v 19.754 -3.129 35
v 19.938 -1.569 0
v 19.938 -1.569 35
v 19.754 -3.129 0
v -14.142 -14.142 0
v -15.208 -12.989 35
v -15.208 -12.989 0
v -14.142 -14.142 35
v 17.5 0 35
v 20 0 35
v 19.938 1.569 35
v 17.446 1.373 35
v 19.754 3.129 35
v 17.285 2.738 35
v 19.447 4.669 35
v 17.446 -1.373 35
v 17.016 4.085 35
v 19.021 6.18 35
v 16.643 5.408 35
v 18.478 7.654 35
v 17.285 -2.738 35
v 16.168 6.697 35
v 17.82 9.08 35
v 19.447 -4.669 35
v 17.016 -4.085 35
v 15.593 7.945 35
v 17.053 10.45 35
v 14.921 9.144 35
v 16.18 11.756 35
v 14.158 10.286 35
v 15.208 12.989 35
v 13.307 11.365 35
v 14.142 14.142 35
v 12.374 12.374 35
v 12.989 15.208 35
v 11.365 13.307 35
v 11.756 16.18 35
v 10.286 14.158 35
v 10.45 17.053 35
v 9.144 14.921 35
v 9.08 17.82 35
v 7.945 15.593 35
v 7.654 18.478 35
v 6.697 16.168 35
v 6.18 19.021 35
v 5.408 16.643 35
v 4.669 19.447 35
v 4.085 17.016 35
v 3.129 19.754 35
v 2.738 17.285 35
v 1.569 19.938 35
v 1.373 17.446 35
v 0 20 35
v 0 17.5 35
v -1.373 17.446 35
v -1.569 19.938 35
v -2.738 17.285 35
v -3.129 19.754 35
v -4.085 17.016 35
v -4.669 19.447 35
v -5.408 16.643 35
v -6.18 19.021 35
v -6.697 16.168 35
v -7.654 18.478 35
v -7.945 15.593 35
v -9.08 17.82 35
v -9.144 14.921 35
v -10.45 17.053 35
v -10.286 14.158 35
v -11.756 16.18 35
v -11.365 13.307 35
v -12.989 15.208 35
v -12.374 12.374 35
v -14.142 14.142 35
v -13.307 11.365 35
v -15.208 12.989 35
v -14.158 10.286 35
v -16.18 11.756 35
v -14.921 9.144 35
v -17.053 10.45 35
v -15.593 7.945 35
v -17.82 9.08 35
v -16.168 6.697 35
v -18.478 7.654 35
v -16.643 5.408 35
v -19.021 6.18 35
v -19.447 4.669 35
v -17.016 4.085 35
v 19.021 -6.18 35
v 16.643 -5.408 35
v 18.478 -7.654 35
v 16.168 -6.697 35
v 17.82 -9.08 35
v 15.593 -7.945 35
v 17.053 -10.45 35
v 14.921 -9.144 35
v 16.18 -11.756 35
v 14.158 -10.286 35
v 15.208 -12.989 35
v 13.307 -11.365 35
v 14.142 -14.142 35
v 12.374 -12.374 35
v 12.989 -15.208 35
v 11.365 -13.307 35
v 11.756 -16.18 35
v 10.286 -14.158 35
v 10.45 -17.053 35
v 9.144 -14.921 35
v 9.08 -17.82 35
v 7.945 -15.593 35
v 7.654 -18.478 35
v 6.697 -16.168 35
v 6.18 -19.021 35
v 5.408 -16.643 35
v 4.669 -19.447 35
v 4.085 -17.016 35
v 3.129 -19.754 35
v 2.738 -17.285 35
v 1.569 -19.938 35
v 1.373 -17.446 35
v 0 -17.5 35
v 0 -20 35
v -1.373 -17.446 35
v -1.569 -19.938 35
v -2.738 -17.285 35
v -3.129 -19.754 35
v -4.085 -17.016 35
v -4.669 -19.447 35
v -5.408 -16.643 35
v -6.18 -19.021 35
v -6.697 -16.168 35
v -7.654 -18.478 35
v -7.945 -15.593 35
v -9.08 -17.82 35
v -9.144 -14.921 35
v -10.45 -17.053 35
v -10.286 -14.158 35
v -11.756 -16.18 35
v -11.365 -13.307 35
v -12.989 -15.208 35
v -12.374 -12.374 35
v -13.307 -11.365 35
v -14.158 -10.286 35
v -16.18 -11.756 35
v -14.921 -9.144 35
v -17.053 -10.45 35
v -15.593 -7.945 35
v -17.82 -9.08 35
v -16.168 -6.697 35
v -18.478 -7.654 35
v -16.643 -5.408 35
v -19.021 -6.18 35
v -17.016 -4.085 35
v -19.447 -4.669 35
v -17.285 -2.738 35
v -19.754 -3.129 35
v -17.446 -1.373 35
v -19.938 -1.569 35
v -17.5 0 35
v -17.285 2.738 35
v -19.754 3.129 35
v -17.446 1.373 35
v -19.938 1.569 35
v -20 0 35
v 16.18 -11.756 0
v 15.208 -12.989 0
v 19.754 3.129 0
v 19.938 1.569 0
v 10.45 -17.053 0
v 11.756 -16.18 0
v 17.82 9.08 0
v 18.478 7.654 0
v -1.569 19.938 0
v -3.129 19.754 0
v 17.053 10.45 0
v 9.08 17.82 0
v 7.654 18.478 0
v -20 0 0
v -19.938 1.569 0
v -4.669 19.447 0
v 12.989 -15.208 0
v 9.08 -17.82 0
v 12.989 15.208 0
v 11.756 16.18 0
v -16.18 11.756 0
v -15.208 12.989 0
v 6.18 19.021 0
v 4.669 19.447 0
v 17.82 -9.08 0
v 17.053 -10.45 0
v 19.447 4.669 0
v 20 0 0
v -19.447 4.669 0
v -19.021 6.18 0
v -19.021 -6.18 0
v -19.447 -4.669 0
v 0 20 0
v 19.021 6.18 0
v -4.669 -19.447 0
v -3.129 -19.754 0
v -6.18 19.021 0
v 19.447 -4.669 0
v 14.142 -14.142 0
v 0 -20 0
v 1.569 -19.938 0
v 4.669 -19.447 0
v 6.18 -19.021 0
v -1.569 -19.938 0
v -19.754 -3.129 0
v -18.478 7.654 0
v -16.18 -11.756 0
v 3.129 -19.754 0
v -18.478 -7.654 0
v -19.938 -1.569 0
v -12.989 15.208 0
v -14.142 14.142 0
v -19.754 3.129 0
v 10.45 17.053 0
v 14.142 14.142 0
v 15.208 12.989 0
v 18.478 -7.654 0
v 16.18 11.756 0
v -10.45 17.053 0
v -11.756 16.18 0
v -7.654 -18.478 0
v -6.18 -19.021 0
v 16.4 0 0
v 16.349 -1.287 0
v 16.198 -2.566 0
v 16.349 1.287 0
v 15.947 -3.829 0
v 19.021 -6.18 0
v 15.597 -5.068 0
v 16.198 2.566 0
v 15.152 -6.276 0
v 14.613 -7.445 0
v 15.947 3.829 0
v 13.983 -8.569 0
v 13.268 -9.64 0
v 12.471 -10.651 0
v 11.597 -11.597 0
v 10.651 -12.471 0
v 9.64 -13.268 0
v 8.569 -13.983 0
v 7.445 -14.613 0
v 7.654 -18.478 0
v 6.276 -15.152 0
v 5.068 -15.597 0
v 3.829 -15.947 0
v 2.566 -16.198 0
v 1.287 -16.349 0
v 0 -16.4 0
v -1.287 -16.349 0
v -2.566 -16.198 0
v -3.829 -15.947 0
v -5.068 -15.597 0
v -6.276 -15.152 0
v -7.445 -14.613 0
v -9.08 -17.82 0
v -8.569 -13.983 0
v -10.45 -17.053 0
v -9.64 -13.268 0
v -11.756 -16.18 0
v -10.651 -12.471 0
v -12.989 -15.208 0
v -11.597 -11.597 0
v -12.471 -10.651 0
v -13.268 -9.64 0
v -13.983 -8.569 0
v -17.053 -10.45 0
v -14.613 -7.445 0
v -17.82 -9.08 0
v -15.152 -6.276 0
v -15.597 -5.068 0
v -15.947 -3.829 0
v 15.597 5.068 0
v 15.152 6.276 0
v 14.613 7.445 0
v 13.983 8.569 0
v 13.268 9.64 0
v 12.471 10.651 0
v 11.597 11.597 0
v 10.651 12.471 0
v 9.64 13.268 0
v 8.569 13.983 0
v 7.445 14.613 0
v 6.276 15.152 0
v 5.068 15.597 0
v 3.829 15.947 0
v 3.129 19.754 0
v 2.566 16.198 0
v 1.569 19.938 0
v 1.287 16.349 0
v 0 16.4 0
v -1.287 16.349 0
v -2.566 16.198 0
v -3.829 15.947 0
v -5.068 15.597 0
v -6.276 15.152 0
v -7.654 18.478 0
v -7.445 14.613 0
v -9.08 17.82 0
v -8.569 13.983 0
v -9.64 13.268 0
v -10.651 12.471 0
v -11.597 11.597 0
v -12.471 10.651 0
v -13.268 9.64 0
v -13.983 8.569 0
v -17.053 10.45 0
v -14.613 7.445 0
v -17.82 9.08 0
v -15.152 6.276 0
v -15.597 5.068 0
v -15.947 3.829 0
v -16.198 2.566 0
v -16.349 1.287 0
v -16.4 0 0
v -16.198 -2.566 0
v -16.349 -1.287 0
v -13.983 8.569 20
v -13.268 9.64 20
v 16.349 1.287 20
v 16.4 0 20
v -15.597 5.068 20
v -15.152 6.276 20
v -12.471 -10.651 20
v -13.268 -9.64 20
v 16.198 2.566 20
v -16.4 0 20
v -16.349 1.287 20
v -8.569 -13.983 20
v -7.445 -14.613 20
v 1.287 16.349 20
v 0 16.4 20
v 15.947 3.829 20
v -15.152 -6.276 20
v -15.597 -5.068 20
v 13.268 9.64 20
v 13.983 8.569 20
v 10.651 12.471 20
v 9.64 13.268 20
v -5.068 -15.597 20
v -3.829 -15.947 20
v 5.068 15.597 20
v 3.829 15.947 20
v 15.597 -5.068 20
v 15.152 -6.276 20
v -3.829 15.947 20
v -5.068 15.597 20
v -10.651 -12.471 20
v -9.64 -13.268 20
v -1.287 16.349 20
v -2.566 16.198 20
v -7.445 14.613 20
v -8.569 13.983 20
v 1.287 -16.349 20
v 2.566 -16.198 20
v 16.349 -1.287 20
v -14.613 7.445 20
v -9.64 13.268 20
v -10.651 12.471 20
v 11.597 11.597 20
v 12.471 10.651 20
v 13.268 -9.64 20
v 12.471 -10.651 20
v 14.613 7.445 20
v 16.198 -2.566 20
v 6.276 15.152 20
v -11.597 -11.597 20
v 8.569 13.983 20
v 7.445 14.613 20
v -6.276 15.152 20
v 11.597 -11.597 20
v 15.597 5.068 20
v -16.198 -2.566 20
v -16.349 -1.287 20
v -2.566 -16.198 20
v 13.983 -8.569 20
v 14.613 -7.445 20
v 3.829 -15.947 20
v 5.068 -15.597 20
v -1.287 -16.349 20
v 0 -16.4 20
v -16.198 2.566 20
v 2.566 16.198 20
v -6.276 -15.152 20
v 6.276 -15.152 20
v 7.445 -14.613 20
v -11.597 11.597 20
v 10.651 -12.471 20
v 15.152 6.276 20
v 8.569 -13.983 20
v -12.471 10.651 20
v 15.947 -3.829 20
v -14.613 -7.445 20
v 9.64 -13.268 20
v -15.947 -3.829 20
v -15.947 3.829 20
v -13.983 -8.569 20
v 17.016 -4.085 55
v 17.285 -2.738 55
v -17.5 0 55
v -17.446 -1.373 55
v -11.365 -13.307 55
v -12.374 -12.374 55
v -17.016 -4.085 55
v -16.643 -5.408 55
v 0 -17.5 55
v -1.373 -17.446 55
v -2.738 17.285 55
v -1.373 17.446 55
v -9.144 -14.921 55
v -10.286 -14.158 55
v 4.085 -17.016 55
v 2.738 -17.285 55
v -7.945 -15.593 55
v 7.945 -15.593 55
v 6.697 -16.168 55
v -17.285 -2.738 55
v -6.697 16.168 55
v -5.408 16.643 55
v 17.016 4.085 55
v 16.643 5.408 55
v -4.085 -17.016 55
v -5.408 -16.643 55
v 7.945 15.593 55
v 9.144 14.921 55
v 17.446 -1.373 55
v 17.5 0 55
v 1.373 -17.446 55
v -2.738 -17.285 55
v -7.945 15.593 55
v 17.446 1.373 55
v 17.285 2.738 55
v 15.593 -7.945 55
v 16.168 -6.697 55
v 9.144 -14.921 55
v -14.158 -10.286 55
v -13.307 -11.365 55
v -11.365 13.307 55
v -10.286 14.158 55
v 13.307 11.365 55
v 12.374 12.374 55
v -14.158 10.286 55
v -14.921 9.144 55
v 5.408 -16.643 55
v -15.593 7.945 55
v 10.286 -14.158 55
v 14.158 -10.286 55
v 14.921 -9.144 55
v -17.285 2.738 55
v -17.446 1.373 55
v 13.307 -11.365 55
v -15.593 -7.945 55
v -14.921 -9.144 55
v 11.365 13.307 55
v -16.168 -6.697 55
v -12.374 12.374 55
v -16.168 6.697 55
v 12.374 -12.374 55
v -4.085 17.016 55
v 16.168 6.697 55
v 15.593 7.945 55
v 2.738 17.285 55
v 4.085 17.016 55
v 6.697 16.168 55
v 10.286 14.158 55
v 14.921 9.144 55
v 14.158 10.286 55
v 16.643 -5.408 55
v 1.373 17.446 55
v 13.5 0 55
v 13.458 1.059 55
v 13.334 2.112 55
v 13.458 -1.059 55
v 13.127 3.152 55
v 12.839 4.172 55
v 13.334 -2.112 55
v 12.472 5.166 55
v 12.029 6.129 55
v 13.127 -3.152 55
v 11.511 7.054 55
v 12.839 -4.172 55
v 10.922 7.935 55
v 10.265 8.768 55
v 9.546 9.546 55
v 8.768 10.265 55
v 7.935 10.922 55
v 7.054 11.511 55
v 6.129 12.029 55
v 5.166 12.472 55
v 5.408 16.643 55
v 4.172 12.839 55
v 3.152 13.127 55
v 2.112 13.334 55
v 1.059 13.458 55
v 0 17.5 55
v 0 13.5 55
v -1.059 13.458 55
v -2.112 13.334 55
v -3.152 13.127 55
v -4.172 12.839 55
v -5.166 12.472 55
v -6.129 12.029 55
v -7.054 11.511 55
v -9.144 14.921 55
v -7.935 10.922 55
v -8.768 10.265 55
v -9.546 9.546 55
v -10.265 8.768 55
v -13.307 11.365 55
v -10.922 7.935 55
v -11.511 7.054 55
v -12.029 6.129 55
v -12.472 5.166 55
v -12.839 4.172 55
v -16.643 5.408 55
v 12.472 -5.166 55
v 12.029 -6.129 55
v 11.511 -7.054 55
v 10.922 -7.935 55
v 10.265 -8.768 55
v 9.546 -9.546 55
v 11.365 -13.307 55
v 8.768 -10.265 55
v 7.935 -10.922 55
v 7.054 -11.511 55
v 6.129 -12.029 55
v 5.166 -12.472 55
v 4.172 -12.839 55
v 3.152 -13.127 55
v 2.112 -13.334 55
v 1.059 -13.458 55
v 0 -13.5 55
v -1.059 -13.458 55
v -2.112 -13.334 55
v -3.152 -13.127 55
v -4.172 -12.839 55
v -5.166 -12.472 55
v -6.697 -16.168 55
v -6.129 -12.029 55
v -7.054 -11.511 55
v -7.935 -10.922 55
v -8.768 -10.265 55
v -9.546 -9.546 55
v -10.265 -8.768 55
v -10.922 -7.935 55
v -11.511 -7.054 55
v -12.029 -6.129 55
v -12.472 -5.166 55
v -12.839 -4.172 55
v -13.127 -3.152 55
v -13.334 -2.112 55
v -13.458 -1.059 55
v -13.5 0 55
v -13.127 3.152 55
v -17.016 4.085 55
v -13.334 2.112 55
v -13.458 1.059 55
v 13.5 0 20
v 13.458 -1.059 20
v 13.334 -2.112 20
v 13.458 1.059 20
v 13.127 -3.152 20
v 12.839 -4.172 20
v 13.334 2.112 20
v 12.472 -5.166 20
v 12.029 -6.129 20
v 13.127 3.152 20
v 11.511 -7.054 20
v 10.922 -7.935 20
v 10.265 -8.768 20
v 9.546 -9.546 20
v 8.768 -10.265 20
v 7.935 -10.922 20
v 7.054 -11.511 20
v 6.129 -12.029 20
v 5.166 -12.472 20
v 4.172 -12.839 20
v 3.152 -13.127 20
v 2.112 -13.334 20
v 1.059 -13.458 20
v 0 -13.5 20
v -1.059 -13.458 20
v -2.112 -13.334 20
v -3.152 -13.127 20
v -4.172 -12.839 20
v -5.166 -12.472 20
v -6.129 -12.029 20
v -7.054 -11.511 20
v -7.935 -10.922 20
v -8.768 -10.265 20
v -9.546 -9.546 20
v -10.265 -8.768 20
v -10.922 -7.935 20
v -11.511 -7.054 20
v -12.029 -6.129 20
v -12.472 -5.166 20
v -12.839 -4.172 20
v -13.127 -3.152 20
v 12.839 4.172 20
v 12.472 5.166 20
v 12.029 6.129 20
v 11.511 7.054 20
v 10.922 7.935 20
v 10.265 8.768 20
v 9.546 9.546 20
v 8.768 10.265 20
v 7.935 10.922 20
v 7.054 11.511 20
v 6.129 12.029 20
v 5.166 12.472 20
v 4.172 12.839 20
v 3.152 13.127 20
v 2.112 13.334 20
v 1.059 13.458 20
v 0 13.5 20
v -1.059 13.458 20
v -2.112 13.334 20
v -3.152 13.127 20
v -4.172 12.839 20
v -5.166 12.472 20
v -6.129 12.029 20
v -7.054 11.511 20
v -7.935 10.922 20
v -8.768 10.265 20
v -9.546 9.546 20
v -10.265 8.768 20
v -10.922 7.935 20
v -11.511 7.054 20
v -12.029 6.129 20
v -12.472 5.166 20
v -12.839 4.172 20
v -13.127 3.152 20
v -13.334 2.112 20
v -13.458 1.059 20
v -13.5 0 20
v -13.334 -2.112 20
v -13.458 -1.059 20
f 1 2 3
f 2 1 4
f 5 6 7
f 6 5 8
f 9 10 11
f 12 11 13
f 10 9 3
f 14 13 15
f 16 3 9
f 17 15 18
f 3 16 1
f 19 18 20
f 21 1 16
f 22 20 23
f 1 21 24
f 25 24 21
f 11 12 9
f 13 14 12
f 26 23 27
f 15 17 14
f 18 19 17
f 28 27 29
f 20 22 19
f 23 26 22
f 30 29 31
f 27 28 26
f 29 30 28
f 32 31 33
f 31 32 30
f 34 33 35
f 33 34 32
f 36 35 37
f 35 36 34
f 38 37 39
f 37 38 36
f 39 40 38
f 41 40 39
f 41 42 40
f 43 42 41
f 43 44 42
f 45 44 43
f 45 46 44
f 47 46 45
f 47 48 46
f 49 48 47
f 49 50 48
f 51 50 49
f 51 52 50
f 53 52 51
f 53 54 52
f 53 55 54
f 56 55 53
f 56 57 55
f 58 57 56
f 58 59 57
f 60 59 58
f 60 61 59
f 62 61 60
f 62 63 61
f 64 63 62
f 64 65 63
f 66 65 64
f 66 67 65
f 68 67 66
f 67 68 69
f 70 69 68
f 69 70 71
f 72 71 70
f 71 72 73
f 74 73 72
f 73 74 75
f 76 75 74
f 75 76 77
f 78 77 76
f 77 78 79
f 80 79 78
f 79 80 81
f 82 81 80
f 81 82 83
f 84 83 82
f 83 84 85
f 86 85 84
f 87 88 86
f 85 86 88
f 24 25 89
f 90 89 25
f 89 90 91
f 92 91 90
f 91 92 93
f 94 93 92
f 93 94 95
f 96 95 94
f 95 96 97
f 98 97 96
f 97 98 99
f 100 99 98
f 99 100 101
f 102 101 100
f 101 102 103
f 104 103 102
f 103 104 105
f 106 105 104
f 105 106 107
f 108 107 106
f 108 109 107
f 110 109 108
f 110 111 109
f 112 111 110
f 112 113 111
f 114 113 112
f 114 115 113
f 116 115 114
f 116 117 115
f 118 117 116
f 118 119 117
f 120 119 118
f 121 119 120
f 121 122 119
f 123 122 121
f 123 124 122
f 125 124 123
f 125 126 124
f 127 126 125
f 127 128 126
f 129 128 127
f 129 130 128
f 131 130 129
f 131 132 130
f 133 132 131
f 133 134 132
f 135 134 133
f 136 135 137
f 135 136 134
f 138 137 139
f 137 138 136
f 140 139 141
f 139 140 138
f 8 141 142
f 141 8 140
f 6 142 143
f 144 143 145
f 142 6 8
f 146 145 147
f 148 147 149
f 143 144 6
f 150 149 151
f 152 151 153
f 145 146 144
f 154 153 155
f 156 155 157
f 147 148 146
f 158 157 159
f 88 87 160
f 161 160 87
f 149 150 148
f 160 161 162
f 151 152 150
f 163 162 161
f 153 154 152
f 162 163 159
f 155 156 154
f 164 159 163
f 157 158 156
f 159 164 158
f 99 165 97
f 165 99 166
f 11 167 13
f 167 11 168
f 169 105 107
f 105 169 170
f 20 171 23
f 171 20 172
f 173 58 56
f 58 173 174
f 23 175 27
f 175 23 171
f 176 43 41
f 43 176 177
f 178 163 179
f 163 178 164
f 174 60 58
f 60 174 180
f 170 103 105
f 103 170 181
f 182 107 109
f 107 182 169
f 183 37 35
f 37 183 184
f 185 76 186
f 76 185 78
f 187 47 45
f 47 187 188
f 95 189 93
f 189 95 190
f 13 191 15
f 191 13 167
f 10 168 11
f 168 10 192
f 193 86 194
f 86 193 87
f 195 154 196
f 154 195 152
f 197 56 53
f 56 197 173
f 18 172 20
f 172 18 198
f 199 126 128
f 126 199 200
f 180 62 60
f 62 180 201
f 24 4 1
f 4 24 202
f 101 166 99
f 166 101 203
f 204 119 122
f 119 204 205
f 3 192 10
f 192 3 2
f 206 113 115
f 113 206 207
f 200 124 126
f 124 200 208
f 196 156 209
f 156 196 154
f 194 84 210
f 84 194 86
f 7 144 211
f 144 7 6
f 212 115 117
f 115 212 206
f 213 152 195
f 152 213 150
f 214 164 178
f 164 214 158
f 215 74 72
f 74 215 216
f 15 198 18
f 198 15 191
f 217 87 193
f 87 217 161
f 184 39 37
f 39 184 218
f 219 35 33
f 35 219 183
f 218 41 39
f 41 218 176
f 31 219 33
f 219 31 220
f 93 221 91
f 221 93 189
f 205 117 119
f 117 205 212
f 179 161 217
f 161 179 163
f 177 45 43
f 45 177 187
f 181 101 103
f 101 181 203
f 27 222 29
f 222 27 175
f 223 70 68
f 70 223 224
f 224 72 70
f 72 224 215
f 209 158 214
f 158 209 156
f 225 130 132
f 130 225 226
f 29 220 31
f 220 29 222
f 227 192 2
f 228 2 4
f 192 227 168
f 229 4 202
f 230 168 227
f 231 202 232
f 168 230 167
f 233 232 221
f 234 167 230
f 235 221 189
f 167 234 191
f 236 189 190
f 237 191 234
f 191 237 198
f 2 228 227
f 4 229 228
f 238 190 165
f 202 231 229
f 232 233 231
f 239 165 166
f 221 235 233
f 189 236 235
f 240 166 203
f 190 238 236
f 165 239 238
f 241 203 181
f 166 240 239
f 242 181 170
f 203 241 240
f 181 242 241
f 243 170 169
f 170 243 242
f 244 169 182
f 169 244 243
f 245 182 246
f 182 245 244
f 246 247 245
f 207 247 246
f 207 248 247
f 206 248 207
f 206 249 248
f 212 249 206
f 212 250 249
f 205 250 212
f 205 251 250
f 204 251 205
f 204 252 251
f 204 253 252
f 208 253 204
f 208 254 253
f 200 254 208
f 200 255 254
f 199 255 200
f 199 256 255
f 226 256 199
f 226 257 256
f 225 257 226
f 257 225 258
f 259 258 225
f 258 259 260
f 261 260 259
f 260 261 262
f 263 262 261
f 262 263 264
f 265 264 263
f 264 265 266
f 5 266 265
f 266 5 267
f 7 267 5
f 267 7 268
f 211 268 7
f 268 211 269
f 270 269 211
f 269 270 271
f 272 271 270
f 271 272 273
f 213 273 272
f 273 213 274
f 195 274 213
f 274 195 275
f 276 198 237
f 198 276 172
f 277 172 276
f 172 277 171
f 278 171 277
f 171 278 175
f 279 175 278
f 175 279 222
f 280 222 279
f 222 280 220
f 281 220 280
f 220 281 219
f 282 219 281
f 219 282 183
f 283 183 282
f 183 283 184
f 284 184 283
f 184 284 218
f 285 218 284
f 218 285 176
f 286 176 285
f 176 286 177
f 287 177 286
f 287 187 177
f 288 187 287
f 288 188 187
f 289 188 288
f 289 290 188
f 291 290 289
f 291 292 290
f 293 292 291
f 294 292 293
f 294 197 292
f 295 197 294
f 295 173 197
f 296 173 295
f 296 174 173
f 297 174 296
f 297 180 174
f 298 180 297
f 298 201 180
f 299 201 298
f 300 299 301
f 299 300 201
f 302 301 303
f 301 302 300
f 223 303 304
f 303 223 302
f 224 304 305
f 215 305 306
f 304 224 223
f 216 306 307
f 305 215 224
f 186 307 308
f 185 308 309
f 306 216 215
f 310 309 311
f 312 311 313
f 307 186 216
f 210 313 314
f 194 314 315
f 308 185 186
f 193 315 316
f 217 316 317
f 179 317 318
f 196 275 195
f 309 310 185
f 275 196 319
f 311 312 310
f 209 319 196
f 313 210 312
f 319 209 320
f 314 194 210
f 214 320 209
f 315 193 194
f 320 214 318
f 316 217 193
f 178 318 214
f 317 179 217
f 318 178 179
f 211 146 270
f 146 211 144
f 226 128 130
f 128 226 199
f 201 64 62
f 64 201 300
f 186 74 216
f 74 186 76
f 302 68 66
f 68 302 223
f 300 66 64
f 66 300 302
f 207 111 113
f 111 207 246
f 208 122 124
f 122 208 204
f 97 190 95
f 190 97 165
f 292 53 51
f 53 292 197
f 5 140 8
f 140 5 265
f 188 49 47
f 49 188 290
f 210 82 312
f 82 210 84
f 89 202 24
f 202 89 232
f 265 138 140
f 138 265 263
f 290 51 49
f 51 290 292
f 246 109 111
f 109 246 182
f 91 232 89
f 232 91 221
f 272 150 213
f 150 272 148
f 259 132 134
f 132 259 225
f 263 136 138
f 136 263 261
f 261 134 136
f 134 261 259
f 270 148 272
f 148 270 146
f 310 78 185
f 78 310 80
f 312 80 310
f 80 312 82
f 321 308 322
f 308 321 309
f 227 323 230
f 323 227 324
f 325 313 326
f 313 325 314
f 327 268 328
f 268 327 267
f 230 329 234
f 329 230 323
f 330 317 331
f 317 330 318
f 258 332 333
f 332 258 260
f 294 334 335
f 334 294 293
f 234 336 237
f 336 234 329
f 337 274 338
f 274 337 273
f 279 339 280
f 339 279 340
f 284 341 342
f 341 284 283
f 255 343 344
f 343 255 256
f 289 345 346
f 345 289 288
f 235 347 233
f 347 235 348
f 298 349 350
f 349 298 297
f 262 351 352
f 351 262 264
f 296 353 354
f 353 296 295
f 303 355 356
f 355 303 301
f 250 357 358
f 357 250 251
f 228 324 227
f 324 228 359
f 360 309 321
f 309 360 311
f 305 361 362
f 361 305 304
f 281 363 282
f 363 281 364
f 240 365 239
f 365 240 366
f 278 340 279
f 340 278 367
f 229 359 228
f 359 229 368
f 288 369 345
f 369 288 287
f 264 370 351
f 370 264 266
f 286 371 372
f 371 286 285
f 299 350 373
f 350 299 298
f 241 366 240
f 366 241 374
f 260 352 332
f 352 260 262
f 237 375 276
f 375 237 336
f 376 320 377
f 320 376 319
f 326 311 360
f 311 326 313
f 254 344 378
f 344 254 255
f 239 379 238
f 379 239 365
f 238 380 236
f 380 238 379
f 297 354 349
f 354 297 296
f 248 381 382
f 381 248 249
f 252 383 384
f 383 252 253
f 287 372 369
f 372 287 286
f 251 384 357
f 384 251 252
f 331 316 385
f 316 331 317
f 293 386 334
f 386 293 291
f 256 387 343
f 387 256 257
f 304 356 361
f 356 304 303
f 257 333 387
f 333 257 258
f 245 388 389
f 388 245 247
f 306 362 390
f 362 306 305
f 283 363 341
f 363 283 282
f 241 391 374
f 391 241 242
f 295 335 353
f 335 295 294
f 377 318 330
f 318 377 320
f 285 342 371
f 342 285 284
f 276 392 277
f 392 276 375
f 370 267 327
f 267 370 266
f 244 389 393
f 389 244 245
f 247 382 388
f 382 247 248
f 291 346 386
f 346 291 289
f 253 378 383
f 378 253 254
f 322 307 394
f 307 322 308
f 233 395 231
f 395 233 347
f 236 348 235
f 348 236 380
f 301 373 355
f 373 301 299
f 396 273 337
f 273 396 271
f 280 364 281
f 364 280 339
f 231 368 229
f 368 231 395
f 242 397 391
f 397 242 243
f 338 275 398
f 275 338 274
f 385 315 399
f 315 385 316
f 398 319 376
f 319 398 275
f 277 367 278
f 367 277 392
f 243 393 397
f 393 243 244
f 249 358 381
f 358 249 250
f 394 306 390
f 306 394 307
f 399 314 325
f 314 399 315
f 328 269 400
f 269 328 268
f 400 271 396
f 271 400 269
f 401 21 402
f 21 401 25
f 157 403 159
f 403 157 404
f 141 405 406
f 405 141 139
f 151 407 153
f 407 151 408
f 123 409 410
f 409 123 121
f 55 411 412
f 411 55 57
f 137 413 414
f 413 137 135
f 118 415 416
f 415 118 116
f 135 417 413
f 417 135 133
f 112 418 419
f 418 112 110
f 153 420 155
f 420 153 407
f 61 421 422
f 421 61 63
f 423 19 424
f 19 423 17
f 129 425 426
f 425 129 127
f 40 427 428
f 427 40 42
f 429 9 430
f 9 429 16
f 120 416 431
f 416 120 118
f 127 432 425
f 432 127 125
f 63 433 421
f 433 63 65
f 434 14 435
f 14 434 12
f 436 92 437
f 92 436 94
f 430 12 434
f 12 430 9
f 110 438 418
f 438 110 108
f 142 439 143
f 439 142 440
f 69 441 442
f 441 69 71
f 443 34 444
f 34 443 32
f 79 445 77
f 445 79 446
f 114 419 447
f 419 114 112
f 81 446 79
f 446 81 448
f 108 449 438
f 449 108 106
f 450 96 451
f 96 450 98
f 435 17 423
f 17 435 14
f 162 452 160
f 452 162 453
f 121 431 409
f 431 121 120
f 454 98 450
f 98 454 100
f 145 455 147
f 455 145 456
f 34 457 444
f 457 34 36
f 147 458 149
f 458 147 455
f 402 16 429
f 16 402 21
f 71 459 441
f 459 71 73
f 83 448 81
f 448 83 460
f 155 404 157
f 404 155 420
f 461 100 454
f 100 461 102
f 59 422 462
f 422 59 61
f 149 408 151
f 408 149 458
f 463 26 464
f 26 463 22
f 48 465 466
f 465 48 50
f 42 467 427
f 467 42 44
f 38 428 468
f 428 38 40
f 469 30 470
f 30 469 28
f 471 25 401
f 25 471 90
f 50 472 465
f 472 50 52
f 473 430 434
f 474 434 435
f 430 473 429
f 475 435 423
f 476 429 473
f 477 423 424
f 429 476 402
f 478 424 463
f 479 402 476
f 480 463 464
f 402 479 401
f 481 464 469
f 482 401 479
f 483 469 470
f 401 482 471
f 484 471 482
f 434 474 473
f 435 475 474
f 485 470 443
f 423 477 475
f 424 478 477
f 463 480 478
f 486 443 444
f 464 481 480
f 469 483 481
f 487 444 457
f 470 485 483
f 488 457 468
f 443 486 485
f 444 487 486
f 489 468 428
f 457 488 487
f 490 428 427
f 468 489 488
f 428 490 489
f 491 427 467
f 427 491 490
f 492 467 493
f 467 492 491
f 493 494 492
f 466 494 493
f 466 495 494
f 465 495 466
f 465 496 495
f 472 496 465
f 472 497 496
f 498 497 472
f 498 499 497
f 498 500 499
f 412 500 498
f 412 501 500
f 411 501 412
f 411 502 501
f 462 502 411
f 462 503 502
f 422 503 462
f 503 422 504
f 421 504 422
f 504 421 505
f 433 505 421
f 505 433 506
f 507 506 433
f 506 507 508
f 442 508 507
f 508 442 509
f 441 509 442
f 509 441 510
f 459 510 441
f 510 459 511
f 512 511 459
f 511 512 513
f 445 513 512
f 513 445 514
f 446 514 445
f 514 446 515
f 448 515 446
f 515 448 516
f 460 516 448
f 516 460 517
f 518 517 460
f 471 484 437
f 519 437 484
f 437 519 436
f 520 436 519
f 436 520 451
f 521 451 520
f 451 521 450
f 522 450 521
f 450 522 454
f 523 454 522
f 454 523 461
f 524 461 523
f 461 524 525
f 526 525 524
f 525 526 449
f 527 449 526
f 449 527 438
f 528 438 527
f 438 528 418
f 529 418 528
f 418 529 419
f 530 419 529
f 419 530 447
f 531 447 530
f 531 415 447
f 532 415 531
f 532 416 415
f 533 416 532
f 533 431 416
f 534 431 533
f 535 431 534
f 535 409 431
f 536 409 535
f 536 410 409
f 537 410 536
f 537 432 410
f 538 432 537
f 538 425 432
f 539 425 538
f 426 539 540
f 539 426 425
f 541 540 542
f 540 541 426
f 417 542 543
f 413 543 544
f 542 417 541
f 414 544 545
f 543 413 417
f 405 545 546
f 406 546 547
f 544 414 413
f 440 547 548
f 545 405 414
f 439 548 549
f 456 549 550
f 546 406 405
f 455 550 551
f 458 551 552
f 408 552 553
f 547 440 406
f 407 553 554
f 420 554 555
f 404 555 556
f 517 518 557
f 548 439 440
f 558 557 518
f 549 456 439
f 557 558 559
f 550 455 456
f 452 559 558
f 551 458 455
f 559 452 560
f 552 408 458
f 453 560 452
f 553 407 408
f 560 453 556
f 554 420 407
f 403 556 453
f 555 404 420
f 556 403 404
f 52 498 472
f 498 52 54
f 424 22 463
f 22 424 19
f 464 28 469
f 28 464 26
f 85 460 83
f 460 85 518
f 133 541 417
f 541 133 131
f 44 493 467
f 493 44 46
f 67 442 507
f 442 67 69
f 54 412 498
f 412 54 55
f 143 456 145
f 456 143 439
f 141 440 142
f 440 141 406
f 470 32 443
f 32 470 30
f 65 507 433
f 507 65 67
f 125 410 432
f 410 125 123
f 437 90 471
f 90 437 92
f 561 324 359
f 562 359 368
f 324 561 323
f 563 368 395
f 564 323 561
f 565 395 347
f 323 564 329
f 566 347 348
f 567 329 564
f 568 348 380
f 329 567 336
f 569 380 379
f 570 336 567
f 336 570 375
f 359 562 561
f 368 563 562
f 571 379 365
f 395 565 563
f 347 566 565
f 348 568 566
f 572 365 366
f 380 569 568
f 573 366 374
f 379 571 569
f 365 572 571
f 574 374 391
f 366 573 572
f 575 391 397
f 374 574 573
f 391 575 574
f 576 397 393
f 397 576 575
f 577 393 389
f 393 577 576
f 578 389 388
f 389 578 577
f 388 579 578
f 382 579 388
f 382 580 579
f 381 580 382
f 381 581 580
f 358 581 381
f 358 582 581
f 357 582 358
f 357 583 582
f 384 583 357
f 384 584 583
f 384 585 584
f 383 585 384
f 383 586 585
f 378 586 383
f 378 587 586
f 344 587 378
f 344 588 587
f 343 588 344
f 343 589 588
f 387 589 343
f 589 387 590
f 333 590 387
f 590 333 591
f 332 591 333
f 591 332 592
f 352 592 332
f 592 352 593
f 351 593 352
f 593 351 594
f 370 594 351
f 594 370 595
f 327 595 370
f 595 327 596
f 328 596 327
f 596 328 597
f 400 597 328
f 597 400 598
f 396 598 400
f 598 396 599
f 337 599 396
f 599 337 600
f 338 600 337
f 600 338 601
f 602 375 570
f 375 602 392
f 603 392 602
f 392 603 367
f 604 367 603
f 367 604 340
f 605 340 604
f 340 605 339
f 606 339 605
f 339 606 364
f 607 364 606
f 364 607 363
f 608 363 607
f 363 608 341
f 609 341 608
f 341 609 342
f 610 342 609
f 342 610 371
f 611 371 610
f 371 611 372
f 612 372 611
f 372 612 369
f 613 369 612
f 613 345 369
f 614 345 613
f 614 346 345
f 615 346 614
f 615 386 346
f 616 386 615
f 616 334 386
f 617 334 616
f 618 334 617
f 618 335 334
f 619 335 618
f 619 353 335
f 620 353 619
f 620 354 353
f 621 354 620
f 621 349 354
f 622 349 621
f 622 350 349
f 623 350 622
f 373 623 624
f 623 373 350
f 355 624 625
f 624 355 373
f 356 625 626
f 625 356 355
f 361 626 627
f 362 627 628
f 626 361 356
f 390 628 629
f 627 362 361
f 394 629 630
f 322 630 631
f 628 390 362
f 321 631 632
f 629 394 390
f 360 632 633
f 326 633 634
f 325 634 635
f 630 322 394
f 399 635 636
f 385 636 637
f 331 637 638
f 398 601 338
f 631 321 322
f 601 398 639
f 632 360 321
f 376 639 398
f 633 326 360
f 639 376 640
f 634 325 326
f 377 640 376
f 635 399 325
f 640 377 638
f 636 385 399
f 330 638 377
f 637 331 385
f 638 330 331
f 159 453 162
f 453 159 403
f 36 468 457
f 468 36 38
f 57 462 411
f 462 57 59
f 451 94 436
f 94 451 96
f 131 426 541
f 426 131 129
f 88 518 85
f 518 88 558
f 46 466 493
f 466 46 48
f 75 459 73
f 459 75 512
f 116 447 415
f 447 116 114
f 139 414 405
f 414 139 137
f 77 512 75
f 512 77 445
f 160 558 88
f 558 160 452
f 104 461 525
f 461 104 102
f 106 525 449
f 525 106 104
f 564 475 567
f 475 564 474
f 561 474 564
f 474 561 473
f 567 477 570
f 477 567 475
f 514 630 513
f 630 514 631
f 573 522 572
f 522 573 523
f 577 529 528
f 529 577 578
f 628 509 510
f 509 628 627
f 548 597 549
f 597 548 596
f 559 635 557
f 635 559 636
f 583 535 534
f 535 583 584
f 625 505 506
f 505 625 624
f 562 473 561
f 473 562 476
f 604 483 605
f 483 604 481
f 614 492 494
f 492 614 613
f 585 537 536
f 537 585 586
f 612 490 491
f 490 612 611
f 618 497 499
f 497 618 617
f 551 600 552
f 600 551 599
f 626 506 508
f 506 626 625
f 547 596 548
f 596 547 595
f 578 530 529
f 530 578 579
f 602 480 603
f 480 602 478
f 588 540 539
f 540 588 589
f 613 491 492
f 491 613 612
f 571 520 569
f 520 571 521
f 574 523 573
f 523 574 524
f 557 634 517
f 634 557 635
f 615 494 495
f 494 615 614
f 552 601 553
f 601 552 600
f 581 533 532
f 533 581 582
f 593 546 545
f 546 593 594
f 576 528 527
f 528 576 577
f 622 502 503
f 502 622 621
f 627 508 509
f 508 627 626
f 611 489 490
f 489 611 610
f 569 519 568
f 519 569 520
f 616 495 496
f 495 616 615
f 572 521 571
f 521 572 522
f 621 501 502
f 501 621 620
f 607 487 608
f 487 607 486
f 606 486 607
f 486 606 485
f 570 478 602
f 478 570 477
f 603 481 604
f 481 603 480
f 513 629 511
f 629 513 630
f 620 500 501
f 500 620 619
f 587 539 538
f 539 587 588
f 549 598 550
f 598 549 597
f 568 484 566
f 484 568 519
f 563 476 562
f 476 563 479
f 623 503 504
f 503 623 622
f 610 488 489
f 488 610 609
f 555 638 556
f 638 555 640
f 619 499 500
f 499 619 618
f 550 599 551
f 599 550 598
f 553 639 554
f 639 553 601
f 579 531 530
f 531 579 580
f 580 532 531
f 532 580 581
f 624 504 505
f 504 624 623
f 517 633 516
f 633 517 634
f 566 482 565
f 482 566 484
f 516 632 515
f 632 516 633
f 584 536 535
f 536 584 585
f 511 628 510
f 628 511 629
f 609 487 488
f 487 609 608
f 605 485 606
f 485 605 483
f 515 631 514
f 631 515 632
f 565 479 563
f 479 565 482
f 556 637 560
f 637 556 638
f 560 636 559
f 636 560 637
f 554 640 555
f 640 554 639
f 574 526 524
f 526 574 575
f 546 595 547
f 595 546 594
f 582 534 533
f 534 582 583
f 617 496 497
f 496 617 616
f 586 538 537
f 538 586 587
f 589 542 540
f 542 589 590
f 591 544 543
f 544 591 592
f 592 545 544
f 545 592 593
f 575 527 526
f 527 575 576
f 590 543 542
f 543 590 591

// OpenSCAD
// file: variables.scad
// General

resolution = 80;
delta = 0.2;

// dimensions tubes pvc

rayon_ext_tube_32 = 16;
rayon_int_tube_32 = 13;
epaisseur_tube_32 = rayon_ext_tube_32 - rayon_int_tube_32;

rayon_ext_tube_40 = 20;
rayon_int_tube_40 = 17.5;
epaisseur_tube_40 = rayon_ext_tube_40 - rayon_int_tube_40;

ret32 = rayon_ext_tube_32;
rit32 = rayon_int_tube_32;
ep32  = epaisseur_tube_32;
ret40 = rayon_ext_tube_40;
rit40 = rayon_int_tube_40;
ep40  = epaisseur_tube_40;

// Reducteur

epaisseur_reducteur = 4;

// L'embout accueille un tube pvc de 40mm de diamètre.

hauteur_embout = 20;
rayon_int_embout = rayon_ext_tube_40 + delta;
rayon_ext_embout = 24 + delta;

hauteur_butee = 2;
rayon_int_butee = 16;

// Jonction: section de contact entre les deux pièces.

//hauteur du ressort comprimé
hauteur_ressort = 7.5;

rayon_ext_culot = rayon_ext_tube_40 - delta;
rayon_int_culot = 18 - delta;
hauteur_jonction = 30;

hauteur_totale = hauteur_jonction + hauteur_embout + hauteur_butee + hauteur_ressort;

profondeur_douille = 12;

largeur_empreinte = 6;

nb_baionette = 3;
rayon_baionette = (largeur_empreinte / 2)*0.95;
// file: common.scad
module tube(hauteur, rayon_exterieur, rayon_interieur, resolution=resolution) {
	difference(){
	  cylinder(hauteur, rayon_exterieur, rayon_exterieur, $fn=resolution);
	  translate([0,0,-1])
	 	  cylinder(hauteur + 2 , rayon_interieur, rayon_interieur, $fn=resolution);
	}
}

module donut(rayon_spheres, rayon_exterieur){
	rotate_extrude(convexity = 10, $fn = resolution)
		translate([rayon_exterieur,0,0])
		circle(r = rayon_spheres, $fn = resolution);
}
// main file
include <common.scad>;
include <variables.scad>;

epRed = 4;

tube(35, ret32 + epRed, ret32 + delta*2);

translate([0,0,20])
	tube(35, rit40, rit40 - epRed);
